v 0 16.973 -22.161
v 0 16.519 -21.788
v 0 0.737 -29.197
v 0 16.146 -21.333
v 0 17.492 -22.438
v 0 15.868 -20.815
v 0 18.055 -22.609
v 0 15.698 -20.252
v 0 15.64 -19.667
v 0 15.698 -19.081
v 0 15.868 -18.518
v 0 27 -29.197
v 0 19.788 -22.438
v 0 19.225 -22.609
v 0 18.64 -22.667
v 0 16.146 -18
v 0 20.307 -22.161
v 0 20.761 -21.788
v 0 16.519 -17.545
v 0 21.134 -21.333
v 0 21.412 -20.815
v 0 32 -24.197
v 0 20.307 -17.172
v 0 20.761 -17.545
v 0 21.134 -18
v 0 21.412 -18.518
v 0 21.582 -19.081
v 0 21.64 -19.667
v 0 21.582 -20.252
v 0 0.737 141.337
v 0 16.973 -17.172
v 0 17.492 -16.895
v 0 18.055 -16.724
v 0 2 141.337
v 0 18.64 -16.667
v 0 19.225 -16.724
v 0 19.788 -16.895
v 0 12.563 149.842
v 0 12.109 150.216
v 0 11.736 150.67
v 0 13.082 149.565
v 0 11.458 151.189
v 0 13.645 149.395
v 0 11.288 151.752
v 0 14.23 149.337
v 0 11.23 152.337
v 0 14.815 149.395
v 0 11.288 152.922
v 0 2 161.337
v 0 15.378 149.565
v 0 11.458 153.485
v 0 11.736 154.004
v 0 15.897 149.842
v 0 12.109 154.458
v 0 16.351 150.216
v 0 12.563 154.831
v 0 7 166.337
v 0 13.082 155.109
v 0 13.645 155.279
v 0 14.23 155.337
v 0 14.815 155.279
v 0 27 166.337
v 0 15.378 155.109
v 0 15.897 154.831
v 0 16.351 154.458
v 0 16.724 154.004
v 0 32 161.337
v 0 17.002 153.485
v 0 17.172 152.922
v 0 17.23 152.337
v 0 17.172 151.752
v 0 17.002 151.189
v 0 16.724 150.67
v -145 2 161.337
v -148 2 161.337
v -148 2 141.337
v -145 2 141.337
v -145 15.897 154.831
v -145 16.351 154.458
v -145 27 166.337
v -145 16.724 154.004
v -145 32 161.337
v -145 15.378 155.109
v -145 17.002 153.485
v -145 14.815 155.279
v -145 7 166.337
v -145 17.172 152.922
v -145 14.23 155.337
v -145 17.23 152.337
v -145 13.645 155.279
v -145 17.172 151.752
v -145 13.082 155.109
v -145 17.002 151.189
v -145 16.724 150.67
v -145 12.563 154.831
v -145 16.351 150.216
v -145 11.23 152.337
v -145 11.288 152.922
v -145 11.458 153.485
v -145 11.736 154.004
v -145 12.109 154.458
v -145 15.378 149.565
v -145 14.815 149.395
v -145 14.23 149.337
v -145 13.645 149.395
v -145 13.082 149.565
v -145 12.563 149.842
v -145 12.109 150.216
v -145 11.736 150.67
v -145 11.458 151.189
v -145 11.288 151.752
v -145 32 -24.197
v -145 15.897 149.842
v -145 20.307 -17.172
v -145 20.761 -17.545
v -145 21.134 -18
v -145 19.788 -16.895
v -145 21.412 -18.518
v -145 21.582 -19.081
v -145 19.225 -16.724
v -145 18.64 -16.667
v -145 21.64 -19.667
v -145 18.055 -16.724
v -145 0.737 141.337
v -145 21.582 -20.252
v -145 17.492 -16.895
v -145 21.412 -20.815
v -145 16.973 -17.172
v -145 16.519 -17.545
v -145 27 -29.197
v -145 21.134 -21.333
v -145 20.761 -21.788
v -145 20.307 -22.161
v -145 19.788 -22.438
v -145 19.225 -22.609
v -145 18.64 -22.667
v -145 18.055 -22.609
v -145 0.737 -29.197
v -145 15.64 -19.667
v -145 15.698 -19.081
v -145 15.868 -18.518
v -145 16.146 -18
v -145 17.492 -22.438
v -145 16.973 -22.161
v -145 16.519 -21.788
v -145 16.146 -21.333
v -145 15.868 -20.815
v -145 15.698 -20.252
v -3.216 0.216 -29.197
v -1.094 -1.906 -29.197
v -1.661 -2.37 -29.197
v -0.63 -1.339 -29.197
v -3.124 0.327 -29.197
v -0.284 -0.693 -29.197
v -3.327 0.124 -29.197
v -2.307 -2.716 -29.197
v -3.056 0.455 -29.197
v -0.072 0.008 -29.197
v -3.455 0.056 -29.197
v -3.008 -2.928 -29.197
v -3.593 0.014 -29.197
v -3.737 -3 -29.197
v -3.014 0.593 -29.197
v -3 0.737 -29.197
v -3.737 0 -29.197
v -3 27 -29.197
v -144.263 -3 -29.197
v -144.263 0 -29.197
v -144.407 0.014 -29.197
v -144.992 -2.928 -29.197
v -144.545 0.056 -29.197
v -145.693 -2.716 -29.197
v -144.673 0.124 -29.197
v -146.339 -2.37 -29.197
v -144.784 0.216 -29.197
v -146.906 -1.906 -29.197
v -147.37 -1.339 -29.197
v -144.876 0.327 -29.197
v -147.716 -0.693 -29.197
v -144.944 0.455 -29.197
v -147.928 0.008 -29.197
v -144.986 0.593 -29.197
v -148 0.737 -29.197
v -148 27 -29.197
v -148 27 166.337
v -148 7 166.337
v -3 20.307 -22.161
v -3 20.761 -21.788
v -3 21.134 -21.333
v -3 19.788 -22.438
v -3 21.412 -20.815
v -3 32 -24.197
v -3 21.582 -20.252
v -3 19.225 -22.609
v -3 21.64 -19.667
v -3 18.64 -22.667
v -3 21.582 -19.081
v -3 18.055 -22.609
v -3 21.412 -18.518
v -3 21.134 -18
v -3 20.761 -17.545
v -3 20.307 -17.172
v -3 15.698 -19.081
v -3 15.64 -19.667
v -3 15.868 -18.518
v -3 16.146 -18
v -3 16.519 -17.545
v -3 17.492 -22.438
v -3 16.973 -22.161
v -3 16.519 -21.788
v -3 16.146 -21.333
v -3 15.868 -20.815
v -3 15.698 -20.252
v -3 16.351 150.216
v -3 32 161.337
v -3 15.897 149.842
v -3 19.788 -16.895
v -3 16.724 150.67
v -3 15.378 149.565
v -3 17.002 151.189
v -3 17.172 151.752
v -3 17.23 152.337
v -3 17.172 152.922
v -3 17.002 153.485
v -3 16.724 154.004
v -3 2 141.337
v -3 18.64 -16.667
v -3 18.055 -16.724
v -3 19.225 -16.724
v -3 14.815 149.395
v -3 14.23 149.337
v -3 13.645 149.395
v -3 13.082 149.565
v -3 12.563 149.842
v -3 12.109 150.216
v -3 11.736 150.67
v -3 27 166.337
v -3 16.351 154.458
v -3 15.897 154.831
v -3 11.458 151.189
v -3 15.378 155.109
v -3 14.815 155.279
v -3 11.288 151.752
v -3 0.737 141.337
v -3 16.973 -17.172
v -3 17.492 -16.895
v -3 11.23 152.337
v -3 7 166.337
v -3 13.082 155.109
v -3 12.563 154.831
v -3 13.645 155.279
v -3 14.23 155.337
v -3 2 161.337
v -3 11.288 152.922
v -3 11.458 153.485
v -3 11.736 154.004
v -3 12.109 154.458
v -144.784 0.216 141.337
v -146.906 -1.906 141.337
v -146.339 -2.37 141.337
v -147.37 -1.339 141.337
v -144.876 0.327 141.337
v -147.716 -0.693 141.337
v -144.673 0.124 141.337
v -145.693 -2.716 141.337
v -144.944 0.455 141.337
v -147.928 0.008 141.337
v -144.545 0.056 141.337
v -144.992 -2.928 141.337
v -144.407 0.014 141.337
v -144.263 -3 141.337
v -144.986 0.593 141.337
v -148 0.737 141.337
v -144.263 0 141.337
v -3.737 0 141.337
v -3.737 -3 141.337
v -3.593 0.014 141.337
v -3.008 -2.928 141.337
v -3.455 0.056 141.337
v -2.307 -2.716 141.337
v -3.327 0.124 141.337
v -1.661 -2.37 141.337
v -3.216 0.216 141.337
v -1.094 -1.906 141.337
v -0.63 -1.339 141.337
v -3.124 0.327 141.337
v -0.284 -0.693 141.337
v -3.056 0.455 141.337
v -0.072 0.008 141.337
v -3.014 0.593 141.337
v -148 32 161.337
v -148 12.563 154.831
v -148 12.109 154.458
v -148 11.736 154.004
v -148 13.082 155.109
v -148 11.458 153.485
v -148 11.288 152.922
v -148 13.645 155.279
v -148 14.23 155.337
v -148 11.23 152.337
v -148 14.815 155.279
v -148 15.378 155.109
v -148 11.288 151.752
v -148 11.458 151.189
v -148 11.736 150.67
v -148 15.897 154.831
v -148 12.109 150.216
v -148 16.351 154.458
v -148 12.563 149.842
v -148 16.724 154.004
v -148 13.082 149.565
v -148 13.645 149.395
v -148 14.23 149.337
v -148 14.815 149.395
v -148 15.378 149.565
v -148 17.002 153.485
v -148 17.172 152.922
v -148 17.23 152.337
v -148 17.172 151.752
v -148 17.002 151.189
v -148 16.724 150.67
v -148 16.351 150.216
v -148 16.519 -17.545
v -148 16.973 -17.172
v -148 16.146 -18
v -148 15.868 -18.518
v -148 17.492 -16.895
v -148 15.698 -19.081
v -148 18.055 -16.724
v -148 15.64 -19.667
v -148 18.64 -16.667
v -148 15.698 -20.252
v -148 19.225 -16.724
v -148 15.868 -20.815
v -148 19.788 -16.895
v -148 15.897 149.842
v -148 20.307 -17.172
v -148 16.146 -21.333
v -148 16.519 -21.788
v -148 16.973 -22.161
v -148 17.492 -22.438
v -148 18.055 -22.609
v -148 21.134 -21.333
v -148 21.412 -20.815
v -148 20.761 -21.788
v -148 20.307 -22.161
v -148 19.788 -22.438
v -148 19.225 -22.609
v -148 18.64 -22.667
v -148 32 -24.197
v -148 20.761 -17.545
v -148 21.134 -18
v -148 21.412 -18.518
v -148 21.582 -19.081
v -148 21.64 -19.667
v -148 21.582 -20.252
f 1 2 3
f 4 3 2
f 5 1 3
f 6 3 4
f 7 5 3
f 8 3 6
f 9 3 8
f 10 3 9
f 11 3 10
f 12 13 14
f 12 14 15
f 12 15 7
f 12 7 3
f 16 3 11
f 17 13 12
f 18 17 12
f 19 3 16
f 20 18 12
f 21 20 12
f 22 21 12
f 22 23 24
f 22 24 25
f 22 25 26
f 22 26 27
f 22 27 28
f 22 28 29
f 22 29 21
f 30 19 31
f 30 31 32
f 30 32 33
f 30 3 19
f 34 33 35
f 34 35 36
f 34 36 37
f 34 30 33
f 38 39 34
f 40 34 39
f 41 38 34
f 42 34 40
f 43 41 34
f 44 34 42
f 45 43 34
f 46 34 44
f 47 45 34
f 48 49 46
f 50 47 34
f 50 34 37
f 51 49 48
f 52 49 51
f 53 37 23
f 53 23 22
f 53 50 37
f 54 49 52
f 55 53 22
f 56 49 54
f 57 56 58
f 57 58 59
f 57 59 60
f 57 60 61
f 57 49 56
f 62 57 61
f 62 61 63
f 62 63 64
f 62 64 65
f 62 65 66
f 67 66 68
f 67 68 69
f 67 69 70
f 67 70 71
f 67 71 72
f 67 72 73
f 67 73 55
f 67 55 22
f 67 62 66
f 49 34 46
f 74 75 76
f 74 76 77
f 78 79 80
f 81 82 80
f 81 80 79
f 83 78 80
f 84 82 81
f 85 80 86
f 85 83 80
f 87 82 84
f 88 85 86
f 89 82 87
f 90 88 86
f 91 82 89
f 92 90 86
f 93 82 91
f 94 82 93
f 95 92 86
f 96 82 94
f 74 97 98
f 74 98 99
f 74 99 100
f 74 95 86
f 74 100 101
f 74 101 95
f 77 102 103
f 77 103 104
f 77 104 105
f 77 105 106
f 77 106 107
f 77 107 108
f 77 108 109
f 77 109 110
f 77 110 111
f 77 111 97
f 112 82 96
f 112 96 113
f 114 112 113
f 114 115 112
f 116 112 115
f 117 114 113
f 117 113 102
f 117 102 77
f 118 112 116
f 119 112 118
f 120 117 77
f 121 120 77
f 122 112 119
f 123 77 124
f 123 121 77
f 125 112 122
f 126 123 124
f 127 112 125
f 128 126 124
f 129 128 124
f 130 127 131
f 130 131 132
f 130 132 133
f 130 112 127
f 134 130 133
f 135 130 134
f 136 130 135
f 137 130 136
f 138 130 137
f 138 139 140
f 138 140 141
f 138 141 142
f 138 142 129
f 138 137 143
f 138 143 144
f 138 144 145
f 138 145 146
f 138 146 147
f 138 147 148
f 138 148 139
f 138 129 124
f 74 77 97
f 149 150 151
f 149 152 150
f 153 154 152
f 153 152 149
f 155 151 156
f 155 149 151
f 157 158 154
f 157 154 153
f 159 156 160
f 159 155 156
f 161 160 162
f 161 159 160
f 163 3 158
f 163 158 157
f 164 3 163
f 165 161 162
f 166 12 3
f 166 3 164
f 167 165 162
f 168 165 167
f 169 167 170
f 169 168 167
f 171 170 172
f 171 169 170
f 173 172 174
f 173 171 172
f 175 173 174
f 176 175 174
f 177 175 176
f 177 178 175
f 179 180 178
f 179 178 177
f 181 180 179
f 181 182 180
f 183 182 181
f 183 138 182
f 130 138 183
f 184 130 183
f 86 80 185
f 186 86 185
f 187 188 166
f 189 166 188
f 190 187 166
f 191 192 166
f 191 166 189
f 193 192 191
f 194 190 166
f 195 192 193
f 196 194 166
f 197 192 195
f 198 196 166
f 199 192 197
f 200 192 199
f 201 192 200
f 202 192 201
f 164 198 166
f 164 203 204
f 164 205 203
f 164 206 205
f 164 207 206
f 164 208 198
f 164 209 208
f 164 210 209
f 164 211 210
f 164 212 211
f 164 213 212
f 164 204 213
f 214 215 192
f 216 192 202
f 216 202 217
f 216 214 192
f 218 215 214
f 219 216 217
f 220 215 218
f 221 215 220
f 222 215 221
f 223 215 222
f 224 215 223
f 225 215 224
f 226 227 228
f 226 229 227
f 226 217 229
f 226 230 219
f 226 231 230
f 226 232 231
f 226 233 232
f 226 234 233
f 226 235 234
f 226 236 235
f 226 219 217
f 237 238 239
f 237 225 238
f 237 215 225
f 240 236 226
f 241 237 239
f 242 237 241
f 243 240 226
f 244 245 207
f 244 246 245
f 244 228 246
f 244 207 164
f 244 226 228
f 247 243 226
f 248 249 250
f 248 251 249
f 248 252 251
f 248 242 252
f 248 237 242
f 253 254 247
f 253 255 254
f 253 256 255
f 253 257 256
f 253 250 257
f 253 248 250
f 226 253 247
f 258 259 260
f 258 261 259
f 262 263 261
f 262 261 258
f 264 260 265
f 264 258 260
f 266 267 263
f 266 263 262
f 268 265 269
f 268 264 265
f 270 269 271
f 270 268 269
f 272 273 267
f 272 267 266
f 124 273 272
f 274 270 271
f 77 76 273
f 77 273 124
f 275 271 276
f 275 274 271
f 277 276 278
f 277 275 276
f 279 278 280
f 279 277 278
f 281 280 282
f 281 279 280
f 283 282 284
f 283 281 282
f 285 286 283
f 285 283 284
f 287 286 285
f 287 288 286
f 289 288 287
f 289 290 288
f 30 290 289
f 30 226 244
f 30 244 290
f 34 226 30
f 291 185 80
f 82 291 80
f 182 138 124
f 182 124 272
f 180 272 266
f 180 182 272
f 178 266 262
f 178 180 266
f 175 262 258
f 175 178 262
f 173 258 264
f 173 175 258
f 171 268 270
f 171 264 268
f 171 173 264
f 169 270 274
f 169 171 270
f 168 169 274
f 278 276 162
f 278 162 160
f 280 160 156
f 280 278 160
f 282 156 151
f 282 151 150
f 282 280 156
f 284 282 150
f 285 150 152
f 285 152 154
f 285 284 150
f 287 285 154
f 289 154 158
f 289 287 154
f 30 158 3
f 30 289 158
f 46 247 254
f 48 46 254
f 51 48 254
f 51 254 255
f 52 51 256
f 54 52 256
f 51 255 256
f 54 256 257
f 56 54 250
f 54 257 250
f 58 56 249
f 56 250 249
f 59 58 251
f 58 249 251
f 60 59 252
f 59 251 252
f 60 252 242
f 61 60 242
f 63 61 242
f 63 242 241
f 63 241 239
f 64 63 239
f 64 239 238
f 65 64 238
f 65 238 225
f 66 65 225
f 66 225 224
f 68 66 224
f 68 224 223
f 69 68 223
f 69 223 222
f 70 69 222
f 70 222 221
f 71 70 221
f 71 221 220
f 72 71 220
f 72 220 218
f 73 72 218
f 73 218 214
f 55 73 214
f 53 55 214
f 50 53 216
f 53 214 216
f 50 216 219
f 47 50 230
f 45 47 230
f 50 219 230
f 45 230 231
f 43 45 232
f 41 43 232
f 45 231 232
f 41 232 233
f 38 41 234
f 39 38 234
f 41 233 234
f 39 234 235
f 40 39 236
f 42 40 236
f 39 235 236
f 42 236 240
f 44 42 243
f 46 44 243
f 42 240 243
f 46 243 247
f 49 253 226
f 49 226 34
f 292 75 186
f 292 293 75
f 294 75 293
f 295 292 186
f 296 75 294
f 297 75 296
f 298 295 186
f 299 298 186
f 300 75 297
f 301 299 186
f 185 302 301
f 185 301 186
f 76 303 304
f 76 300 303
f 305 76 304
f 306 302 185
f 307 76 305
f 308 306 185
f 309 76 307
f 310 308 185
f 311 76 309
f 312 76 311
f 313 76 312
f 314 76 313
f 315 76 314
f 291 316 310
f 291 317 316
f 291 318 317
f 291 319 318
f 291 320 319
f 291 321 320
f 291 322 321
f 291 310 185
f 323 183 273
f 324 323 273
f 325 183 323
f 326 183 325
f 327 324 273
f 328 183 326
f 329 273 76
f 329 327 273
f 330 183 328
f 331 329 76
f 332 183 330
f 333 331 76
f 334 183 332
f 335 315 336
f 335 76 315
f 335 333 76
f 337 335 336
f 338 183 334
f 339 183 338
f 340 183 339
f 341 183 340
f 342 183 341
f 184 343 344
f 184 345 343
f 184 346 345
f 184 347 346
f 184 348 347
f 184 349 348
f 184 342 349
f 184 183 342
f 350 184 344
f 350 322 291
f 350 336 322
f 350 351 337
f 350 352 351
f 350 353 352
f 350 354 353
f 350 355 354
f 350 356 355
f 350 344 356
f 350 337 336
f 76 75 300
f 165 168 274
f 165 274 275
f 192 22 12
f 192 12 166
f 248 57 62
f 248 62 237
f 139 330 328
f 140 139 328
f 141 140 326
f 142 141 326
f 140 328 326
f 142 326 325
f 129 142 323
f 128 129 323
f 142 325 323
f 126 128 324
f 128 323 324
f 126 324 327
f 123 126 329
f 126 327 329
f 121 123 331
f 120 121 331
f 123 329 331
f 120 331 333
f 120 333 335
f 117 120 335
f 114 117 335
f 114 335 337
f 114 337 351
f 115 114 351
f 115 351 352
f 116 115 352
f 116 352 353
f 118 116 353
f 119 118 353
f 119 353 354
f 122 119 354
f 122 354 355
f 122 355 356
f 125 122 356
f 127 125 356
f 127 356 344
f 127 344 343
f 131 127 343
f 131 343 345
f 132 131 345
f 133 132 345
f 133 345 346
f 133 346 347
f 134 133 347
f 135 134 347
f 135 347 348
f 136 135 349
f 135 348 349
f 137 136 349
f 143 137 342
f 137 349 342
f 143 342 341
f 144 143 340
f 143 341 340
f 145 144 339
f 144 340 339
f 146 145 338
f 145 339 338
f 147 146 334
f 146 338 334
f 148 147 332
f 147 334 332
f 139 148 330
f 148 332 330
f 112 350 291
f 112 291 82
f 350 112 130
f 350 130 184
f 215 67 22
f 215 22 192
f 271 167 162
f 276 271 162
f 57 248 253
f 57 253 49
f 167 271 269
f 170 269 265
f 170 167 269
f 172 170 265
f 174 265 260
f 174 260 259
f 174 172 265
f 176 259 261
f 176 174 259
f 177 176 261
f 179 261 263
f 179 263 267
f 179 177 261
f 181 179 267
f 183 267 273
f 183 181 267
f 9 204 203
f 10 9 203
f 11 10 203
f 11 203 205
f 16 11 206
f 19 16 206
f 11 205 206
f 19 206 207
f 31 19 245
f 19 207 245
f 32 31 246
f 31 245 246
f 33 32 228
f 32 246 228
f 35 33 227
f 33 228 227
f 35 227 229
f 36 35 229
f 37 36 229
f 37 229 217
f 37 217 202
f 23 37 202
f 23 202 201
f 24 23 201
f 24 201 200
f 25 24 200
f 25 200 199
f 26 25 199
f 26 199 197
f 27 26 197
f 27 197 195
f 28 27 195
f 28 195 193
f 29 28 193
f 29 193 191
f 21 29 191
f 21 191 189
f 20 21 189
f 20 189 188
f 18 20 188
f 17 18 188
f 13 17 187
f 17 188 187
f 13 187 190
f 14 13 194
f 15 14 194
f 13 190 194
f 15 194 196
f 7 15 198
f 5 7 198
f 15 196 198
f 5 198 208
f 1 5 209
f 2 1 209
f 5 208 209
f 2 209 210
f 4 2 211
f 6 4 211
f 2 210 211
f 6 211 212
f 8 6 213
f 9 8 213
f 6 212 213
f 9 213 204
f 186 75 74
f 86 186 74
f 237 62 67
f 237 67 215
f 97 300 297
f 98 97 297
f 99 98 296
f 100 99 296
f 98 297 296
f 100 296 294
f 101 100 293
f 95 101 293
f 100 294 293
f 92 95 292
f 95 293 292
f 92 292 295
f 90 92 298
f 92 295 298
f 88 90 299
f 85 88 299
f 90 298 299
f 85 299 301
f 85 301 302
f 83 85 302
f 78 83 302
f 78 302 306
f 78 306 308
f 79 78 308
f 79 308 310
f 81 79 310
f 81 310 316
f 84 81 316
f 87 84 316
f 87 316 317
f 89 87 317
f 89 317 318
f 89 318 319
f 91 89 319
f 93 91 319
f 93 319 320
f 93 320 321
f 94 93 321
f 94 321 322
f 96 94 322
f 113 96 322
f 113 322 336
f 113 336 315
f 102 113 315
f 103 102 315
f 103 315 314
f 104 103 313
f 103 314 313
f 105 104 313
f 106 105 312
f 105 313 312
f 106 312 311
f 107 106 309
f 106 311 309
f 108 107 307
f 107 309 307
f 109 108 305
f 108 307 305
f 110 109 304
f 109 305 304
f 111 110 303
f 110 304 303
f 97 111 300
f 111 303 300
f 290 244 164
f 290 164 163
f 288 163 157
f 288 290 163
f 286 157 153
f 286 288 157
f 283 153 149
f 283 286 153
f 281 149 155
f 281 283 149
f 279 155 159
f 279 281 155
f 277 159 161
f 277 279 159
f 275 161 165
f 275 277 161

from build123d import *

# Parameters (mm, degrees)
SKETCH18_W                     = 148
SKETCH18_H                     = 205.5334
BASE_FLANGE1_DEPTH             = 3
EDGE_FLANGE1_STRIP_W           = 13.4732
EDGE_FLANGE1_STRIP_H           = 3
EDGE_FLANGE1_STRIP_CUT_DEPTH   = 205.5334
EDGE_FLANGE1_STRIP_2_W         = 13.4732
EDGE_FLANGE1_STRIP_2_H         = 3
EDGE_FLANGE1_STRIP_CUT_2_DEPTH = 205.5334
EDGE_FLANGE1_DEPTH             = 205.5334
EDGE_FLANGE1_BEND_DEPTH        = 205.5334
SKETCH28_W                     = 150
SKETCH28_H                     = 8
CUT_EXTRUDE2_DEPTH             = 25
SKETCH30_R                     = 3
CUT_EXTRUDE3_DEPTH             = 225.935458149
SKETCH31_W                     = 157.455262849
SKETCH31_H                     = 40
CUT_EXTRUDE4_DEPTH             = 10
CHAMFER1_SIZE                  = 5


# Sheet-metal steps are written as plain solids
with BuildPart() as part:
    # Sketch18 → Base-Flange1 (new body)
    with BuildSketch(Plane(origin=(0, 0, 0), x_dir=(1, 0, 0), z_dir=(0, 1, 0))):
        with Locations((-74, -63.57018807)):
            Rectangle(SKETCH18_W, SKETCH18_H)
    extrude(amount=-BASE_FLANGE1_DEPTH)

    # Edge-Flange1 strip (across the edge) → Edge-Flange1 strip cut (cut)
    with BuildSketch(Plane(origin=(0, 0, 166.33688807), x_dir=(-1, 0, 0), z_dir=(0, 0, -1))):
        with Locations((-3, -1.5)):
            Rectangle(EDGE_FLANGE1_STRIP_W, EDGE_FLANGE1_STRIP_H)
    extrude(amount=EDGE_FLANGE1_STRIP_CUT_DEPTH, mode=Mode.SUBTRACT)

    # Edge-Flange1 strip 2 (across the edge) → Edge-Flange1 strip cut 2 (cut)
    with BuildSketch(Plane(origin=(-148, 0, -39.19651193), x_dir=(1, 0, 0), z_dir=(0, 0, 1))):
        with Locations((-3, -1.5)):
            Rectangle(EDGE_FLANGE1_STRIP_2_W, EDGE_FLANGE1_STRIP_2_H)
    extrude(amount=EDGE_FLANGE1_STRIP_CUT_2_DEPTH, mode=Mode.SUBTRACT)

    # Edge-Flange1 section (across the edge) → Edge-Flange1 (add)
    with BuildSketch(Plane(origin=(0, 0, 166.33688807), x_dir=(-1, 0, 0), z_dir=(0, 0, -1))):
        with BuildLine():
            Line((0, 0.7366), (0, 32))
            Line((0, 32), (3, 32))
            Line((3, 32), (3, 0.7366))
            ThreePointArc((3, 0.7366), (3.215745145, 0.215745145), (3.7366, 0))
            Line((3.7366, 0), (3.7366, -3))
            ThreePointArc((3.7366, -3), (1.094424801, -1.905575199), (0, 0.7366))
        make_face()
    extrude(amount=EDGE_FLANGE1_DEPTH)

    # Edge-Flange1 section 2 (across the edge) → Edge-Flange1 bend (add)
    with BuildSketch(Plane(origin=(-148, 0, -39.19651193), x_dir=(1, 0, 0), z_dir=(0, 0, 1))):
        with BuildLine():
            Line((0, 0.7366), (0, 32))
            Line((0, 32), (3, 32))
            Line((3, 32), (3, 0.7366))
            ThreePointArc((3, 0.7366), (3.215745145, 0.215745145), (3.7366, 0))
            Line((3.7366, 0), (3.7366, -3))
            ThreePointArc((3.7366, -3), (1.094424801, -1.905575199), (0, 0.7366))
        make_face()
    extrude(amount=EDGE_FLANGE1_BEND_DEPTH)

    # Sketch28 → Cut-Extrude2 (cut)
    with BuildSketch(Plane.XY.offset(166.33688807)):
        with Locations((-74, -2)):
            Rectangle(SKETCH28_W, SKETCH28_H)
    extrude(amount=-CUT_EXTRUDE2_DEPTH, mode=Mode.SUBTRACT)

    # Sketch30 → Cut-Extrude3 (cut, through all)
    with BuildSketch(Plane.ZY.offset(148)):
        with Locations(Location((152.33688807, 14.23, 0), (0, 0, 270))):
            Circle(SKETCH30_R)
        with Locations(Location((-19.66651193, 18.64, 0), (0, 0, 270))):
            Circle(SKETCH30_R)
    extrude(amount=-CUT_EXTRUDE3_DEPTH, mode=Mode.SUBTRACT)

    # Sketch31 → Cut-Extrude4 (cut)
    with BuildSketch(Plane(origin=(0, 0, -39.19651193), x_dir=(-1, 0, 0), z_dir=(0, 0, -1))):
        with Locations((75.148815223, 17)):
            Rectangle(SKETCH31_W, SKETCH31_H)
    extrude(amount=-CUT_EXTRUDE4_DEPTH, mode=Mode.SUBTRACT)

    # Chamfer1
    chamfer1_edges = [part.edges().sort_by_distance(p)[0] for p in [
        (-1.5, 2, 166.33688807),
        (-146.5, 32, -29.19651193),
        (-1.5, 32, -29.19651193),
        (-1.5, 32, 166.33688807),
        (-146.5, 32, 166.33688807),
        (-146.5, 2, 166.33688807),
    ]]
    chamfer(chamfer1_edges, length=CHAMFER1_SIZE)


solid = part.part
